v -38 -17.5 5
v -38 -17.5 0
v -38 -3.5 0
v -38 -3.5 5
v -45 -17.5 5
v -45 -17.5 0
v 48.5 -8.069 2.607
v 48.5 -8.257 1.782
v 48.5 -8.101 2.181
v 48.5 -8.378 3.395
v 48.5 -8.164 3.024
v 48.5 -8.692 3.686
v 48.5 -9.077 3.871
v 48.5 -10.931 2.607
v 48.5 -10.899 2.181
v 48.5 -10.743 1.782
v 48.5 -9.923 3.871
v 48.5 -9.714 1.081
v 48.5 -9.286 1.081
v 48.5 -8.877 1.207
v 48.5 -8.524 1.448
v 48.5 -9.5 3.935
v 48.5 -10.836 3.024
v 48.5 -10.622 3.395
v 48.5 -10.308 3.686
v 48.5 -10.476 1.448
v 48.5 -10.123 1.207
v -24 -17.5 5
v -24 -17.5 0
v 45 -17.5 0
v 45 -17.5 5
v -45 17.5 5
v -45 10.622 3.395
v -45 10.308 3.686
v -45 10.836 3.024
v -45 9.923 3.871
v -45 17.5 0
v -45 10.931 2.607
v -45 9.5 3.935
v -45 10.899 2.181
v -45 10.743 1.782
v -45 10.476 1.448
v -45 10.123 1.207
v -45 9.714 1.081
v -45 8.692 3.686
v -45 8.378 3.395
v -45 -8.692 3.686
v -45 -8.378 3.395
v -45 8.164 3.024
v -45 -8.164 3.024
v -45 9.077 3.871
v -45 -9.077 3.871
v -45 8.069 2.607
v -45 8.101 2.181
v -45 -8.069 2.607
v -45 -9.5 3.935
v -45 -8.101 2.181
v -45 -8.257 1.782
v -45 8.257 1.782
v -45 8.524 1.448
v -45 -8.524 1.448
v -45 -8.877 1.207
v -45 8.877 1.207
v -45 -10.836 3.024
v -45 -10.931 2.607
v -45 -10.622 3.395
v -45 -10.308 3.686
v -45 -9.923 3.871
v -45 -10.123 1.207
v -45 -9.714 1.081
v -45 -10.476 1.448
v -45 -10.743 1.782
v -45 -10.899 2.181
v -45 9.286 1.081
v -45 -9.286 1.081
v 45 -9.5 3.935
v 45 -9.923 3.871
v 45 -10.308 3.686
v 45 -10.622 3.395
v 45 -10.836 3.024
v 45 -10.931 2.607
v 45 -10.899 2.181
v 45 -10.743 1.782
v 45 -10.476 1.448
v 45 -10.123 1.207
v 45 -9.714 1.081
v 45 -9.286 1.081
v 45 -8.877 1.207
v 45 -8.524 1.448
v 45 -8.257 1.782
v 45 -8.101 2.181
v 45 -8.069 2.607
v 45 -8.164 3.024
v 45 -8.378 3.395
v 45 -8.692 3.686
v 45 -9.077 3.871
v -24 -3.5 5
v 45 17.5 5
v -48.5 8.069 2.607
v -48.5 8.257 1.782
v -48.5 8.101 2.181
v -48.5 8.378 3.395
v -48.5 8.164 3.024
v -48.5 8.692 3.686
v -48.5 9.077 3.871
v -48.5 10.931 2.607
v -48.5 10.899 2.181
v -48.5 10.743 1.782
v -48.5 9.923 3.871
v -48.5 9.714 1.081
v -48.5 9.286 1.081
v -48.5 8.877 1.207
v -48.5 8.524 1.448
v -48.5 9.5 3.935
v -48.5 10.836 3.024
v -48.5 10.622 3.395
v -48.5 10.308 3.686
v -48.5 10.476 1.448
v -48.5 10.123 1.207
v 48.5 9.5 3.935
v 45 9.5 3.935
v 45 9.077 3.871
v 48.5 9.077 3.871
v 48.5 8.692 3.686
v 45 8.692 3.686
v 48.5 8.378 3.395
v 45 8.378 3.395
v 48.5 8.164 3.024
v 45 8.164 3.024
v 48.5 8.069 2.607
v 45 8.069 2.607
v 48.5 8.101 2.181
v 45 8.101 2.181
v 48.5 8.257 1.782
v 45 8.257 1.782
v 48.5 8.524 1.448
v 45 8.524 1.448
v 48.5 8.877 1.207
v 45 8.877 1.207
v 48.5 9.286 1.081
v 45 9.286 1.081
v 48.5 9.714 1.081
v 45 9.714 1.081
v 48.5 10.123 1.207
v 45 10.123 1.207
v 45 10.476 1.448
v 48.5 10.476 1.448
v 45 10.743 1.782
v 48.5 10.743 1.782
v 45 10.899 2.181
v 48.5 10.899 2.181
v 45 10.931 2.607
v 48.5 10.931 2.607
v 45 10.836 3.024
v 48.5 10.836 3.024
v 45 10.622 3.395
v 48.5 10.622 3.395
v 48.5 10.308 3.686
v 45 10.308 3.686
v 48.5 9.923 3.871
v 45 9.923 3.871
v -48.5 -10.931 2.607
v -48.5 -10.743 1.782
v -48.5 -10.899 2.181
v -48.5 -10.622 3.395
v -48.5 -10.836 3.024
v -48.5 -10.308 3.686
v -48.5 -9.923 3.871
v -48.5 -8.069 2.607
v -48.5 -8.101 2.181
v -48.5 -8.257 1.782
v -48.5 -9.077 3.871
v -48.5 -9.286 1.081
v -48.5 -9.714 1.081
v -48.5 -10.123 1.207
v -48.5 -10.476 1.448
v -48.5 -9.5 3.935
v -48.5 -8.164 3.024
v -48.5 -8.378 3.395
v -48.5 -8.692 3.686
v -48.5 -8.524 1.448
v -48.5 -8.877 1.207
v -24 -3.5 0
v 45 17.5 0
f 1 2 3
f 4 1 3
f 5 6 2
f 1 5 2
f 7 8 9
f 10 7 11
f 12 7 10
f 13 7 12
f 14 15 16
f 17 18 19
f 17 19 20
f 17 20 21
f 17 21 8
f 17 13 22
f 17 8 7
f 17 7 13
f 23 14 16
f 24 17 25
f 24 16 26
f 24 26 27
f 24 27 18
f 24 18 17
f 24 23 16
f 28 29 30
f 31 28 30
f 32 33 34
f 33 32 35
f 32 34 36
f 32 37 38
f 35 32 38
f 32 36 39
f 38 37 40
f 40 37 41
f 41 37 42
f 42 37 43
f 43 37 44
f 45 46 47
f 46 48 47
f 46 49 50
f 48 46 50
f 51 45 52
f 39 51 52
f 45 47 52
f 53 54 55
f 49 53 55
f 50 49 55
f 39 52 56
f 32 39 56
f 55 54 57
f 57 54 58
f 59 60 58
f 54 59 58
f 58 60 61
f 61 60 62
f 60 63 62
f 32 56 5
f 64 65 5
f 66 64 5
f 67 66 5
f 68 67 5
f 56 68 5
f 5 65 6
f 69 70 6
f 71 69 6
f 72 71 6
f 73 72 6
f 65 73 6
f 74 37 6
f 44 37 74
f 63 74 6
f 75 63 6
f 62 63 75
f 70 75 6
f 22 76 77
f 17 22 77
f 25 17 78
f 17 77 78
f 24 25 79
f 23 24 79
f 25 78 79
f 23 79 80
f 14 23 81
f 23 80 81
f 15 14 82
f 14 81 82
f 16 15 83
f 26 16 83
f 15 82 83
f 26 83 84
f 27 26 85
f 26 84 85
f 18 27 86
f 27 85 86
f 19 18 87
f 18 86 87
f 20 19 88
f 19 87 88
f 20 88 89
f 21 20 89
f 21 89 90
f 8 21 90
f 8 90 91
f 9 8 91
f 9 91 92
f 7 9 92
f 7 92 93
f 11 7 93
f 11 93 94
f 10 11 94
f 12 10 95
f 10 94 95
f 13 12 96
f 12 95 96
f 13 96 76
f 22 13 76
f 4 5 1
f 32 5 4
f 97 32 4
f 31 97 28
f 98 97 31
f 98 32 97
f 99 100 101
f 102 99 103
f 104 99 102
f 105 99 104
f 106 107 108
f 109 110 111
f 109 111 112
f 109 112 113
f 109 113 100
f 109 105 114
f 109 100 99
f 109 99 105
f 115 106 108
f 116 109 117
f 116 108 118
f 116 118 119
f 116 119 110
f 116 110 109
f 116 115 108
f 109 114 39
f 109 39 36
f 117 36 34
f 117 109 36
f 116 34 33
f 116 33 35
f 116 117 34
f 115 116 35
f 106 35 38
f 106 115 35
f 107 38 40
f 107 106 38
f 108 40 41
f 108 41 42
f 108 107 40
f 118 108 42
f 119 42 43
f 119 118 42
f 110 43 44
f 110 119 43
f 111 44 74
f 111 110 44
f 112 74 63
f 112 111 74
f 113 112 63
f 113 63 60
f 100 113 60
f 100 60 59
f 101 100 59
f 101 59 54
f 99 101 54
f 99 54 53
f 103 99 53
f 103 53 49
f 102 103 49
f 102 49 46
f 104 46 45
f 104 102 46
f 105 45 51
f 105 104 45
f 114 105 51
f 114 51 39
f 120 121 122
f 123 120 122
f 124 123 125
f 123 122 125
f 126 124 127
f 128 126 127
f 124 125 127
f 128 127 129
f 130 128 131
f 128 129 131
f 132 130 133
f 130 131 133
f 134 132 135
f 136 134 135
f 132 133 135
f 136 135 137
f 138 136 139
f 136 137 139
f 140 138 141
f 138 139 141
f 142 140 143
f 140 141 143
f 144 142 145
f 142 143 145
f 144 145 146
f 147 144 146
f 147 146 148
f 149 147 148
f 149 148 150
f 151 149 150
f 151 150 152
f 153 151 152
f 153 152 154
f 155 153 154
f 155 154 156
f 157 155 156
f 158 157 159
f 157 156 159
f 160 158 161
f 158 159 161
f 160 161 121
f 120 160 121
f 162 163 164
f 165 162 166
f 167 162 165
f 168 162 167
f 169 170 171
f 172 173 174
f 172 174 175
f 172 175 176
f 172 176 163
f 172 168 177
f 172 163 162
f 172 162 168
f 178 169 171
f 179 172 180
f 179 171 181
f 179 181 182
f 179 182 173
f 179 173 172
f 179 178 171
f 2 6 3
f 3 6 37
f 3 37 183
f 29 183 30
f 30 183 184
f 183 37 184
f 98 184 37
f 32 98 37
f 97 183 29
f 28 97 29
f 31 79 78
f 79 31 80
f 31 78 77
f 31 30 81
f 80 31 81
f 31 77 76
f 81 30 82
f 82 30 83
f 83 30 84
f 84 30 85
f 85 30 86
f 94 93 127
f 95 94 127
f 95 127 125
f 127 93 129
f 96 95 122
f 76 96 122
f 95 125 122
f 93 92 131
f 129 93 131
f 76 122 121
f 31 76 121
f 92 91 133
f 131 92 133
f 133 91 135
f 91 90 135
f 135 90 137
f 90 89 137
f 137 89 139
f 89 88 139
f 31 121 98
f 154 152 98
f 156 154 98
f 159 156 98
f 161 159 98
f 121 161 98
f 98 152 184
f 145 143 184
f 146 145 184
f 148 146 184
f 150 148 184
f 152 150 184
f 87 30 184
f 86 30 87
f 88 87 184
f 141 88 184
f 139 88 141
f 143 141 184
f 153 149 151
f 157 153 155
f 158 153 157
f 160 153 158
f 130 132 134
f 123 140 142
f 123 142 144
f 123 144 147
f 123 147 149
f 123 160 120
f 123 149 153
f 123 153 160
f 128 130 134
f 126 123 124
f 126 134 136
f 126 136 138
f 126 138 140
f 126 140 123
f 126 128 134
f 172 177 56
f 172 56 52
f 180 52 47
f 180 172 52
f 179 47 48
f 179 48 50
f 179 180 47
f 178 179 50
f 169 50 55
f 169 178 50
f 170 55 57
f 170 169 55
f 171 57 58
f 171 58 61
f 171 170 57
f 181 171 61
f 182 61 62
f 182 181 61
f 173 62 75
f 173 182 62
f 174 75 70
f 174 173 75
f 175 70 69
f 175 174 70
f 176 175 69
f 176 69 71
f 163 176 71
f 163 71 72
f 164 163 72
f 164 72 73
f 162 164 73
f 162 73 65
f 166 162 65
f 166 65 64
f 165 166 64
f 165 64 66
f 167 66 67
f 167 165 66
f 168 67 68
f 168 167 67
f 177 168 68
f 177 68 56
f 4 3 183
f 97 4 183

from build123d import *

# Parameters (mm, degrees)
BOSS_EXTRUDE1_DEPTH = 5
SKETCH2_R           = 1.435
BOSS_EXTRUDE2_DEPTH = 3.5
BOSS_EXTRUDE3_START = 3.5
SKETCH3_R           = 1.435
BOSS_EXTRUDE3_DEPTH = 3.5


with BuildPart() as part:
    # Sketch1 → Boss-Extrude1 (new body)
    with BuildSketch(Plane.XY):
        Polygon((-45, 17.5), (-45, -17.5), (-38, -17.5), (-38, -3.5), (-24, -3.5), (-24, -17.5), (-5, -17.5), (5, -17.5), (45, -17.5), (45, 17.5), align=None)
    extrude(amount=BOSS_EXTRUDE1_DEPTH)

    # Sketch2 → Boss-Extrude2 (add)
    with BuildSketch(Plane(origin=(45, 0, 0), x_dir=(0, 0, -1), z_dir=(1, 0, 0))):
        with Locations(Location((-2.5, 9.5, 0), (0, 0, 180))):
            Circle(SKETCH2_R)
        with Locations(Location((-2.5, -9.5, 0), (0, 0, 180))):
            Circle(SKETCH2_R)
    extrude(amount=BOSS_EXTRUDE2_DEPTH)

    # Sketch3 → Boss-Extrude3 (add)
    with BuildSketch(Plane.ZY.offset(45).offset(BOSS_EXTRUDE3_START)):
        with Locations((2.5, 9.5)):
            Circle(SKETCH3_R)
        with Locations((2.5, -9.5)):
            Circle(SKETCH3_R)
    extrude(amount=-BOSS_EXTRUDE3_DEPTH)


solid = part.part
